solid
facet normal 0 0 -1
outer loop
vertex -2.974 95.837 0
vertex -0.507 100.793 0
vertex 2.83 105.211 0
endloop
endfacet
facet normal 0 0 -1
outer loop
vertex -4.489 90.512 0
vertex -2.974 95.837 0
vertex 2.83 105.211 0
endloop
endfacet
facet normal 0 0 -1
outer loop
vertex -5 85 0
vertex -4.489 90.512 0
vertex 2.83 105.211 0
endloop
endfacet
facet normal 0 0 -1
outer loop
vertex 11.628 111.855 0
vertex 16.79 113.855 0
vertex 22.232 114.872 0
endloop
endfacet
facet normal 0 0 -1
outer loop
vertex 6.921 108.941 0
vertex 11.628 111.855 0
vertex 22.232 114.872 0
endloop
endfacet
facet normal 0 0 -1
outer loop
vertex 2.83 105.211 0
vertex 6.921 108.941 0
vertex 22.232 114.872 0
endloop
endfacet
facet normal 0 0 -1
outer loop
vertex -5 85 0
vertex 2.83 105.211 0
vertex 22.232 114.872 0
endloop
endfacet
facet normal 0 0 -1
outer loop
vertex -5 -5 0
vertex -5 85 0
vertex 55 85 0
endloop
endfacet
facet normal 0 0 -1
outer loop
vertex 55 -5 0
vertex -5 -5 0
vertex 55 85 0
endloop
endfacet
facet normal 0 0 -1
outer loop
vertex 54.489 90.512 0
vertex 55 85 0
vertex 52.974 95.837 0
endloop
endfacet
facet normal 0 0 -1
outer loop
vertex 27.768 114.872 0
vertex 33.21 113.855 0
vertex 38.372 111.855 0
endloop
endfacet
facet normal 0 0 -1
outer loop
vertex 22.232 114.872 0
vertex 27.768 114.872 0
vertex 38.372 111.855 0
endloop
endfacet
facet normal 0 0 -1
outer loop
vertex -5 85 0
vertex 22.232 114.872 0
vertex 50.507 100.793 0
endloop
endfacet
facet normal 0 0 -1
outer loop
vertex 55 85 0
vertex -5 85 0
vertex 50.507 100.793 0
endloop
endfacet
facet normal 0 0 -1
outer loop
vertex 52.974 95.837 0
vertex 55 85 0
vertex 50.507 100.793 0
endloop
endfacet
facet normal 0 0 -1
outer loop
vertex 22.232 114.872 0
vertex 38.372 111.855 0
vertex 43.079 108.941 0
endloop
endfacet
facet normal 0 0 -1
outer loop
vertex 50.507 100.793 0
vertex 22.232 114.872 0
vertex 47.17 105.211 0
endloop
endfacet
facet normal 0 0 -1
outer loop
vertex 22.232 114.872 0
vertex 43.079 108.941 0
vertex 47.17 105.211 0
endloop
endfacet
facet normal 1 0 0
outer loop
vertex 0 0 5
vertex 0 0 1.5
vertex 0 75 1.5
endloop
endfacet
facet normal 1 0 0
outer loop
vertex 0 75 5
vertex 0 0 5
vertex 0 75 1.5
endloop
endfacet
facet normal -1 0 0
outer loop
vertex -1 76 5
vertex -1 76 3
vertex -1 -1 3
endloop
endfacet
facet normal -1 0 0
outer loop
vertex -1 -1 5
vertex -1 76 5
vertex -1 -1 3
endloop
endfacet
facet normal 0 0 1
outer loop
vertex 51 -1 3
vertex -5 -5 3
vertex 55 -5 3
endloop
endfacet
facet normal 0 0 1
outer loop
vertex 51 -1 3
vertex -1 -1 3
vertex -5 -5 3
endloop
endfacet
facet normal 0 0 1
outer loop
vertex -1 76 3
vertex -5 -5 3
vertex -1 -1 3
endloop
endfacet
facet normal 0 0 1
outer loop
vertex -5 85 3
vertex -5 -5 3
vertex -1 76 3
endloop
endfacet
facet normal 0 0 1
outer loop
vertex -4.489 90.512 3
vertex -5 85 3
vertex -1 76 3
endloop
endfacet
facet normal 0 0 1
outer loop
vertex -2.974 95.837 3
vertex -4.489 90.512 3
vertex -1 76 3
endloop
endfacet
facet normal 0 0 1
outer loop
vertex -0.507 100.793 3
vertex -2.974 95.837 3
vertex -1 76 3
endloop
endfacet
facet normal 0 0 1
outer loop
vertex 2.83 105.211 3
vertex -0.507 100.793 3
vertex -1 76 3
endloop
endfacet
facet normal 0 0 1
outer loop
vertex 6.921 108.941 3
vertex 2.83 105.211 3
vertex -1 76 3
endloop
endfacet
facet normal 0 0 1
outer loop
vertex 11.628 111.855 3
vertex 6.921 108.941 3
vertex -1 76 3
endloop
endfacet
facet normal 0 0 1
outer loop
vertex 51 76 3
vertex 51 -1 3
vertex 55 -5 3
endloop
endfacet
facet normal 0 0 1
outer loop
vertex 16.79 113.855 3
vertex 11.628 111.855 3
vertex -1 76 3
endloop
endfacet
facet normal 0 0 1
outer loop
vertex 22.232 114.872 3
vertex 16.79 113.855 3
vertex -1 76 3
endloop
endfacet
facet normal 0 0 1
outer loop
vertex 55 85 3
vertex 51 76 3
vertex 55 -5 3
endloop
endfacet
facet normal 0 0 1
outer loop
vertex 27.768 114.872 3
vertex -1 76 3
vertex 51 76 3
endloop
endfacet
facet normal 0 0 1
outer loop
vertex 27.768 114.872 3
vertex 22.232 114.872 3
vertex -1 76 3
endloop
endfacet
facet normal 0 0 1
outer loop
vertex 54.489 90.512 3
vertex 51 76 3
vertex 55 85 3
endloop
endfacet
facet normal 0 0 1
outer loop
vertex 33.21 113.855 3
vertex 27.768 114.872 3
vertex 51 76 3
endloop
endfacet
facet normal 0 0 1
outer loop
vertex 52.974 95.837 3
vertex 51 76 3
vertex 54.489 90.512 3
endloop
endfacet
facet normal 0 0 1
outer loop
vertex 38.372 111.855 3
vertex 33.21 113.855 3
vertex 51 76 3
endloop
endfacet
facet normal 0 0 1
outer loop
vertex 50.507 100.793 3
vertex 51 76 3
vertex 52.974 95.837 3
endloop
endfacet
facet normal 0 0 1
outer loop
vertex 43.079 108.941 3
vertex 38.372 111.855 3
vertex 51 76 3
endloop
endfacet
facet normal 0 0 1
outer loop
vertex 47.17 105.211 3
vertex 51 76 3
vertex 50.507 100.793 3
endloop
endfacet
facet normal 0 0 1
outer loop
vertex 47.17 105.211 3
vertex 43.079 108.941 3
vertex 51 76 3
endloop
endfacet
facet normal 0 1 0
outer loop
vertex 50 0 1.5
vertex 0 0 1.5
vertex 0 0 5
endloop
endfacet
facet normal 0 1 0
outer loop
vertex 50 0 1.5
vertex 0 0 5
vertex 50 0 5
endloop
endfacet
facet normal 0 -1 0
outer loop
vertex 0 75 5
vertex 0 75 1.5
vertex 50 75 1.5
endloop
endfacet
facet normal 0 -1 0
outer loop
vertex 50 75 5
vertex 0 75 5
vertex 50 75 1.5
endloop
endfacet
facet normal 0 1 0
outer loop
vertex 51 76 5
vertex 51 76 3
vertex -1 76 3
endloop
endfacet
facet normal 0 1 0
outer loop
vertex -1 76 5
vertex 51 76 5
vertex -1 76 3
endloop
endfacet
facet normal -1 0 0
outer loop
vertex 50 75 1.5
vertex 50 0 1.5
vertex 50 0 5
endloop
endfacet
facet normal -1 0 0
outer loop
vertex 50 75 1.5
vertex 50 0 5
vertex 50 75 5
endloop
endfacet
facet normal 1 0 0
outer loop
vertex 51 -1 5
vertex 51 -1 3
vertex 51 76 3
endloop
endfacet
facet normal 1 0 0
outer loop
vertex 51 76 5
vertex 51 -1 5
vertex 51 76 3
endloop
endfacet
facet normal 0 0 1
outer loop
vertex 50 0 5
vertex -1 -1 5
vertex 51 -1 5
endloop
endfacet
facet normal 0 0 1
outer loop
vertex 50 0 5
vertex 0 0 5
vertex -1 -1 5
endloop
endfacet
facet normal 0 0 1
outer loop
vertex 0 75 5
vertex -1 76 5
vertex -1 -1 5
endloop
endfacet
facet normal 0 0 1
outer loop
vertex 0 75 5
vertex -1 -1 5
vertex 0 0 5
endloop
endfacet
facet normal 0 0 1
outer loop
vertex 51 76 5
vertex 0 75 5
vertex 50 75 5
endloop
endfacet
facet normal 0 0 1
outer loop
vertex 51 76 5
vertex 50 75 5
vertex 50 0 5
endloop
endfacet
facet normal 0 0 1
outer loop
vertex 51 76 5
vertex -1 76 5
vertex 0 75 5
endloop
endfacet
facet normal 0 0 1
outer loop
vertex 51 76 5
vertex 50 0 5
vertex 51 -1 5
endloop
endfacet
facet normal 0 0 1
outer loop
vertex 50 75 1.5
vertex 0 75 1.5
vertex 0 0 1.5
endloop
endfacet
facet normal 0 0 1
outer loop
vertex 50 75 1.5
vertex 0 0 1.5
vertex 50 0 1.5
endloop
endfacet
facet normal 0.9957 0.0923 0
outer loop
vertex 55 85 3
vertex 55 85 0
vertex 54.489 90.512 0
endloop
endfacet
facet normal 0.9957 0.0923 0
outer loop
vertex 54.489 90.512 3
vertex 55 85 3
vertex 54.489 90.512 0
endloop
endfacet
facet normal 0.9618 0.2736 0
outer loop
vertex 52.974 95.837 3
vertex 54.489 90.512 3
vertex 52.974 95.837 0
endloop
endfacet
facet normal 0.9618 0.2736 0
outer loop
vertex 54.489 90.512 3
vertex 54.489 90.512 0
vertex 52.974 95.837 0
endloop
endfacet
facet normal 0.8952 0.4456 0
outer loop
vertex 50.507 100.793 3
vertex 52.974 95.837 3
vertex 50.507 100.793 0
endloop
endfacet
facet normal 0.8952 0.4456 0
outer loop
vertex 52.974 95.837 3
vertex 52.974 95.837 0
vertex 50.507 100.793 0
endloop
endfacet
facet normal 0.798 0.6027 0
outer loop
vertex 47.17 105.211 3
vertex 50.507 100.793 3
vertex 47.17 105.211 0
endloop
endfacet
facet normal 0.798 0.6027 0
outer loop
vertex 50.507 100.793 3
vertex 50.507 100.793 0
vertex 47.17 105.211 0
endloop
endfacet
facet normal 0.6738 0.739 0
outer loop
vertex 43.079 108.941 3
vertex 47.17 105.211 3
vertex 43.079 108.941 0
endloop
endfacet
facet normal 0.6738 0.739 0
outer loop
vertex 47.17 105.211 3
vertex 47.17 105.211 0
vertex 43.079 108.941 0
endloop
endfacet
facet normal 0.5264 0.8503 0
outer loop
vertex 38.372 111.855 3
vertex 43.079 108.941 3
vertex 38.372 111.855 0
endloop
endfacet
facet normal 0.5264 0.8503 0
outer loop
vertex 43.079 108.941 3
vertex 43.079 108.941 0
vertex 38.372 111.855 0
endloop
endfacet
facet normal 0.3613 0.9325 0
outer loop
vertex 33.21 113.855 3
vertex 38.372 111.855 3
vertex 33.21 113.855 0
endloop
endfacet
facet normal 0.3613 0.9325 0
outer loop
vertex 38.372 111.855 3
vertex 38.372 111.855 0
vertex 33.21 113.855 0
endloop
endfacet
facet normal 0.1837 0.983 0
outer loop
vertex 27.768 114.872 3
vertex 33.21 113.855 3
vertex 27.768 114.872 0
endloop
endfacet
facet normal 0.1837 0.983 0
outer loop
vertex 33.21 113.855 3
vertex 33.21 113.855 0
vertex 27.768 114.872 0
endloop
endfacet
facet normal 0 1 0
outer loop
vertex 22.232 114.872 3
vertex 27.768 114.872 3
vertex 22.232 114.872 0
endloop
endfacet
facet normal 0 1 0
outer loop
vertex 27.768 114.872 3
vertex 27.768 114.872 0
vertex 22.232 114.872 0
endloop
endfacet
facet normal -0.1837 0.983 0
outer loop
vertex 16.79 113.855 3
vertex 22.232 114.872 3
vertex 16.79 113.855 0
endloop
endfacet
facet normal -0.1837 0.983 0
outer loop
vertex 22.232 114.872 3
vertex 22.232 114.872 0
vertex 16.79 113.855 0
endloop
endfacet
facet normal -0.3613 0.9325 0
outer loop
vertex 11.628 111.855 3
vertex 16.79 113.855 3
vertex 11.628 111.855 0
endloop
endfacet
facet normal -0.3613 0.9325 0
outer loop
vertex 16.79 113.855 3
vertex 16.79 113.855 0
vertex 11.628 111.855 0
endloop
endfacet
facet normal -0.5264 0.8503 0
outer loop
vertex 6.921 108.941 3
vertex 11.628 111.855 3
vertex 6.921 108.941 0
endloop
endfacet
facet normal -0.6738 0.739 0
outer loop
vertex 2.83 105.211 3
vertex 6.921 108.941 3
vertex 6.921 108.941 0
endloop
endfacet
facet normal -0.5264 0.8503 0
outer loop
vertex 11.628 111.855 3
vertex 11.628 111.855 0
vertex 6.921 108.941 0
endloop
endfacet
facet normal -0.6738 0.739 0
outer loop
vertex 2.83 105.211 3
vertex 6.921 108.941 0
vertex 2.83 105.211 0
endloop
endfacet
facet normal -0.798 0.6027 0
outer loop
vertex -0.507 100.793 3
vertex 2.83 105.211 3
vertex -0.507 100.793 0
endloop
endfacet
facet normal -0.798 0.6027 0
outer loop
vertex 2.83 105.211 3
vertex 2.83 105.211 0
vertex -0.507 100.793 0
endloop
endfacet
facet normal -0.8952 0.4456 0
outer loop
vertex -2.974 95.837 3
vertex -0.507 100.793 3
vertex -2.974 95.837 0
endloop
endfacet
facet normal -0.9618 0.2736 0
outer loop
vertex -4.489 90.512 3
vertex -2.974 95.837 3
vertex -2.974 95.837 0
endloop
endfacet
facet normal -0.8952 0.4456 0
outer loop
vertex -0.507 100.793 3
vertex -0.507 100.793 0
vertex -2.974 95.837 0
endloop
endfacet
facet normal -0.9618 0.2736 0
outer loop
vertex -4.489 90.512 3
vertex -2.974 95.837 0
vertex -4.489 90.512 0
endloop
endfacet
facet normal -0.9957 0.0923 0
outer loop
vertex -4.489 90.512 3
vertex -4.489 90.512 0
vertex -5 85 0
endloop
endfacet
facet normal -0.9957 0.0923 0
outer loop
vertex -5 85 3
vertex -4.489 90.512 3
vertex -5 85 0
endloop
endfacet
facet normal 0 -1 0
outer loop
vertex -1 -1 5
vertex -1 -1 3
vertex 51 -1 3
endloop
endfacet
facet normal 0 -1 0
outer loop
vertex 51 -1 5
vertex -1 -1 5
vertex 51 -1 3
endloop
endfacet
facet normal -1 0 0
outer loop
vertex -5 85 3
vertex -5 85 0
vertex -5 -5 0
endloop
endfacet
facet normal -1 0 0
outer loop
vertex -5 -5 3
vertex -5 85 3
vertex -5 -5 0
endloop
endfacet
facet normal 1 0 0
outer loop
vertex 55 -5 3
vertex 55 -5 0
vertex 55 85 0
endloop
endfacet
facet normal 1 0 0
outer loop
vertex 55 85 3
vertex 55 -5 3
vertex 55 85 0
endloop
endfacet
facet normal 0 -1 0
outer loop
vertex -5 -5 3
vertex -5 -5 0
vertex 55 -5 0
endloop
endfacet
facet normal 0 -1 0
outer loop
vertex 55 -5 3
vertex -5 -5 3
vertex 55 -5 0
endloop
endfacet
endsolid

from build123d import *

# Parameters (mm, degrees)
F1_DEPTH = 3
F0_W     = 50
F0_H     = 75
F2_DEPTH = 1.5
F3_DEPTH = 5


with BuildPart() as f1:
    # F0 (on Top) → F1 (new body)
    with BuildSketch(Plane.XY):
        Polygon((55, -5), (55, 0), (55, 85), (-5, 85), (-5, 0), (-5, -5), align=None)
        Polygon((51, 76), (51, 0), (51, -1), (-1, -1), (-1, 76), align=None, mode=Mode.SUBTRACT)
        with BuildLine():
            Line((-5, 85), (55, 85))
            ThreePointArc((55, 85), (25, 115), (-5, 85))
        make_face()
    extrude(amount=F1_DEPTH)



with BuildPart() as f2:
    # F0 (on Top) → F2 (new body)
    with BuildSketch(Plane.XY):
        with Locations((25, 37.5)):
            Rectangle(F0_W, F0_H)
    extrude(amount=F2_DEPTH)


with BuildPart() as f1_1:
    add(f1.part)

    add(f2.part)  # F3 merges F2
    # F0 (on Top) → F3 (join)
    with BuildSketch(Plane.XY):
        Polygon((51, -1), (51, 0), (51, 76), (-1, 76), (-1, -1), align=None)
        with Locations((25, 37.5)):
            Rectangle(F0_W, F0_H, mode=Mode.SUBTRACT)
    extrude(amount=F3_DEPTH)


solid = f1_1.part
